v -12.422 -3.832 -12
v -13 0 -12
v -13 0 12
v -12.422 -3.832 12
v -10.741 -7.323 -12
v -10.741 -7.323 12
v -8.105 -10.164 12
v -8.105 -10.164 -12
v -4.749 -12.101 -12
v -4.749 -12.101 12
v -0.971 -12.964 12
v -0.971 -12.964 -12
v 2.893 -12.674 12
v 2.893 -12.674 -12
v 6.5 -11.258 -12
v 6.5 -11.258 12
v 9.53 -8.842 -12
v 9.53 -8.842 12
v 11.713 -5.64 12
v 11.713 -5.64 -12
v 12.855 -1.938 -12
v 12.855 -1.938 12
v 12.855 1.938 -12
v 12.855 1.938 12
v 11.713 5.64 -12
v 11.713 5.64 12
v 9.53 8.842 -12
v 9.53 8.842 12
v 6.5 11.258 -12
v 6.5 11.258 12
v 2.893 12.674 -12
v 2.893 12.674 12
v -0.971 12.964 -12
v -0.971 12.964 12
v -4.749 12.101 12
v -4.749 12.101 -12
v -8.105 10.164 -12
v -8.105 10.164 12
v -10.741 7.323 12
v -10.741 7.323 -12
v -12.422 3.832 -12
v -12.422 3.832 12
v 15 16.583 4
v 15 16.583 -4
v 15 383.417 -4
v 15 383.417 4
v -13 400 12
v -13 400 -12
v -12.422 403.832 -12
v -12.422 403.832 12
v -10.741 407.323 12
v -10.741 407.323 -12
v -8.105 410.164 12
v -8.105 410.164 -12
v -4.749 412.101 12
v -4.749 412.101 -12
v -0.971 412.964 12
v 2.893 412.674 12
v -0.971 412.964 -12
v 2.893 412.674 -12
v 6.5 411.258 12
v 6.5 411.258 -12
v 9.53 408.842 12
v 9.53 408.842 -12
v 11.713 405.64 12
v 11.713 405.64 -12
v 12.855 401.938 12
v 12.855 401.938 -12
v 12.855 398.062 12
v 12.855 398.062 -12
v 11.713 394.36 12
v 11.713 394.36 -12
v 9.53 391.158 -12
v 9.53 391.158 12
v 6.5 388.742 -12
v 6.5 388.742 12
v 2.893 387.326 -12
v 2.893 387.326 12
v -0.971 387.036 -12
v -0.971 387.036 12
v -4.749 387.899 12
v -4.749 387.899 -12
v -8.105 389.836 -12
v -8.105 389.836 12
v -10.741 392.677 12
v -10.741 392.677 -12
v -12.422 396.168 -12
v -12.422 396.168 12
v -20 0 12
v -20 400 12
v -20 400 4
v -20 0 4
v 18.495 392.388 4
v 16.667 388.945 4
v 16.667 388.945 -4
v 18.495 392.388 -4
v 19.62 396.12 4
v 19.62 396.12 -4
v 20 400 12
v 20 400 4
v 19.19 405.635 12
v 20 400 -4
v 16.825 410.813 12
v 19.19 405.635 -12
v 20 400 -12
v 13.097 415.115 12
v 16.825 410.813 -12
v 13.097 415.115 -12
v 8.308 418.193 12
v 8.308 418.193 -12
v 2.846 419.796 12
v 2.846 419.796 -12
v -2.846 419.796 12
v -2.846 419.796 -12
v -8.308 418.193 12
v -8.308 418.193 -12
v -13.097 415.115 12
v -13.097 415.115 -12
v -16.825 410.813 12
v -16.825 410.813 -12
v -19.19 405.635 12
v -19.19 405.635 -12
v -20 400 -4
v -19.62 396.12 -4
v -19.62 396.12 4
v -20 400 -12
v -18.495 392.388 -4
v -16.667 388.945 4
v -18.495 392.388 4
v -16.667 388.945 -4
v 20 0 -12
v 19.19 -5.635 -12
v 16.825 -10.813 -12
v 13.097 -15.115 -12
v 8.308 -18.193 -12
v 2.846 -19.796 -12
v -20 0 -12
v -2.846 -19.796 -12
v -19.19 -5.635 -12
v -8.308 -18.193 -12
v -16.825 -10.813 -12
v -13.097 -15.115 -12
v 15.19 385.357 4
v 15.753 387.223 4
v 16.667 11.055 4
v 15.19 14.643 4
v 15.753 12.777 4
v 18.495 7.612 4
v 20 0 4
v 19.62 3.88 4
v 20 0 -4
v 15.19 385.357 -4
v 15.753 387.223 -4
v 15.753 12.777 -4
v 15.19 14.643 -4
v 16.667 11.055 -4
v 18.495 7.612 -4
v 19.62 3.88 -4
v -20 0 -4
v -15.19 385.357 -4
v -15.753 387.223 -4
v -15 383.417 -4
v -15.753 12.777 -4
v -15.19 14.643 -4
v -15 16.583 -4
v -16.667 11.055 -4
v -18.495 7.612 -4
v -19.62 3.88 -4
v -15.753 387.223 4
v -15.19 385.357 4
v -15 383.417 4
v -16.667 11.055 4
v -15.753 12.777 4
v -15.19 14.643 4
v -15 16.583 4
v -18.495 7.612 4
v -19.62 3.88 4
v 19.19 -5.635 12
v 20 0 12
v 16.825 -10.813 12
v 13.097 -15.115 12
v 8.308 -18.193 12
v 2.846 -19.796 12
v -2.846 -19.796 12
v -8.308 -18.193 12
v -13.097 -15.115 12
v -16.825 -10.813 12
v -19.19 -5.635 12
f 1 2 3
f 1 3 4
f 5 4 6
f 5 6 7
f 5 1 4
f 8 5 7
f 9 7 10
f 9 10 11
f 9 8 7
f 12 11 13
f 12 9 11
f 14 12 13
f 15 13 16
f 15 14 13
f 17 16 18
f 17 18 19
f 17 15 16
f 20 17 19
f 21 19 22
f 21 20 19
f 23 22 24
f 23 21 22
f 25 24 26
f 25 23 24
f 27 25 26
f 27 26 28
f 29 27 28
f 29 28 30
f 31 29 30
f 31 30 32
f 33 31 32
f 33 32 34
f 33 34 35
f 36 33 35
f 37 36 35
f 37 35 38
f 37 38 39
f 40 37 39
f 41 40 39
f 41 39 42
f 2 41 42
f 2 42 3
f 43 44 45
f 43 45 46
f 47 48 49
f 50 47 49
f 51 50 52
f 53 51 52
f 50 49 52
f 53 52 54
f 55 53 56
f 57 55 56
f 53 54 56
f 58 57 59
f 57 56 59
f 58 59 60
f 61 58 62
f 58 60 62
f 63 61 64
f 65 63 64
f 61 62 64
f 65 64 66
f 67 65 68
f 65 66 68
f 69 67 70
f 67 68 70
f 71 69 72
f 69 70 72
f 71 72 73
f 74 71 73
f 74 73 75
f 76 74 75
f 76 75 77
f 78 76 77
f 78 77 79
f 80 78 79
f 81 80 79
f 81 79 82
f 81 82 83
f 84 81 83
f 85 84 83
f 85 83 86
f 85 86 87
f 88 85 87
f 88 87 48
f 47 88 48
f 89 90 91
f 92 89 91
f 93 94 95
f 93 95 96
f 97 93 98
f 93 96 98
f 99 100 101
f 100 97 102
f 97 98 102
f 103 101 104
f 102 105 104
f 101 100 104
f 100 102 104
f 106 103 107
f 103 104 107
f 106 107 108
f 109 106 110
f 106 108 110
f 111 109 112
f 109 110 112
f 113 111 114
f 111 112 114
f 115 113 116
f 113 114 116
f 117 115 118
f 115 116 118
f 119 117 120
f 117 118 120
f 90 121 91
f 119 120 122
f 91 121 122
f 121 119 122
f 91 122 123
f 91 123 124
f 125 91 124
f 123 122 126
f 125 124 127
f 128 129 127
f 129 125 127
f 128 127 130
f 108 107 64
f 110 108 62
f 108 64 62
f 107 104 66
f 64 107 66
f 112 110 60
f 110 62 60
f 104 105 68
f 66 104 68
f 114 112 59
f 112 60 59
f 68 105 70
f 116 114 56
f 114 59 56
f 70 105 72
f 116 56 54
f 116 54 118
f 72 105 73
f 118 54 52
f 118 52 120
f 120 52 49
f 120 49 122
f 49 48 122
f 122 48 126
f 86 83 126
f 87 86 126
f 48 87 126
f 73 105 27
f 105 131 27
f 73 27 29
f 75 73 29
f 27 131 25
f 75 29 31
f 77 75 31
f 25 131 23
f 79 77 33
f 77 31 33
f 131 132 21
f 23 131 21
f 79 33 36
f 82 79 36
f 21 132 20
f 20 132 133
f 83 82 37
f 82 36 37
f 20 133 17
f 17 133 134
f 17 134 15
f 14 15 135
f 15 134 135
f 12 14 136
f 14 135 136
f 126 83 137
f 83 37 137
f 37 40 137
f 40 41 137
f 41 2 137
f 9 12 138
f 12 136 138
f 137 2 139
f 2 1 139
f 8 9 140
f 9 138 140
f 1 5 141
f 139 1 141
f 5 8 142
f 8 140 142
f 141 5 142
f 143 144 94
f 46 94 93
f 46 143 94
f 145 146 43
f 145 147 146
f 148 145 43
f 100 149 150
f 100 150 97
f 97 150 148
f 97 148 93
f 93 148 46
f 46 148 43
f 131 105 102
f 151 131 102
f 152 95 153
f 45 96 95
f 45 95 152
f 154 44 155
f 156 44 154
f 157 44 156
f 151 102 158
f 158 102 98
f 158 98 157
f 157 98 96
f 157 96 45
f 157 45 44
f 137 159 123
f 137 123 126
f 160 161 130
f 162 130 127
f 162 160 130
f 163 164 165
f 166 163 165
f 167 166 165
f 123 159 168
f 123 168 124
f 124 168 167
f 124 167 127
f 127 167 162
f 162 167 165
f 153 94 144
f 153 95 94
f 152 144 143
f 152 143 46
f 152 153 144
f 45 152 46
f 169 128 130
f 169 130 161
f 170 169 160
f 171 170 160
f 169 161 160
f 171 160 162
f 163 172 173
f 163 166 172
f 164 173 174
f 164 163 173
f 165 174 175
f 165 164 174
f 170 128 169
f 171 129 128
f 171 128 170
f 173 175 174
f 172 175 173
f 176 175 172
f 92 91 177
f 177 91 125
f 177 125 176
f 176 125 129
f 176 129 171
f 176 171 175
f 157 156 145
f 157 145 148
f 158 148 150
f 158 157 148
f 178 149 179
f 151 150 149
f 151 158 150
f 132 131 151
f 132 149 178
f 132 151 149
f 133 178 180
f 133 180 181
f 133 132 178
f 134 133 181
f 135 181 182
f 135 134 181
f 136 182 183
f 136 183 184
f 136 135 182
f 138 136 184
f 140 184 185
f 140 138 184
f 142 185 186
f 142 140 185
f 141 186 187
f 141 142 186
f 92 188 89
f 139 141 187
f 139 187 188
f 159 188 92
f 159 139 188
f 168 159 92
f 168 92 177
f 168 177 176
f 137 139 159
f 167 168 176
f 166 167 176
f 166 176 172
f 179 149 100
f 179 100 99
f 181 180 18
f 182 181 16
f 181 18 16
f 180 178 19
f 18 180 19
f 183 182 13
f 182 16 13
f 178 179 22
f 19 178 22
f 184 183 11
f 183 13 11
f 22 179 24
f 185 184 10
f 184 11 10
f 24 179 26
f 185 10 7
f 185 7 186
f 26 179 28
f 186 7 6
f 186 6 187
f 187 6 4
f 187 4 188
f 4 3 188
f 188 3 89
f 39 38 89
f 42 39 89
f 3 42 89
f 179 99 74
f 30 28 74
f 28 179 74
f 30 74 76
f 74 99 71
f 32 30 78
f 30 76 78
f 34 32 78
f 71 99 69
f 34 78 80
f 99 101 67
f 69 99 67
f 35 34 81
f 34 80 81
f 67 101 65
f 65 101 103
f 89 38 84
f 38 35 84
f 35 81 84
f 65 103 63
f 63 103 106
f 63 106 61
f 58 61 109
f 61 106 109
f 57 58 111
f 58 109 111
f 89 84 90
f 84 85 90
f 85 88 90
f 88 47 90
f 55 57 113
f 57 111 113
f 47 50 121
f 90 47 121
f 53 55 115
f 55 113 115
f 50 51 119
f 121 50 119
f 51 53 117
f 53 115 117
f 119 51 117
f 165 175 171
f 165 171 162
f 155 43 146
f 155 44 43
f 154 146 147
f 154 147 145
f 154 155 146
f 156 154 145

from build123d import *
from build123d.topology import SkipClean

# Parameters (mm, degrees)
BOSS_EXTRUDE1_DEPTH = 400
BOSS_EXTRUDE2_REACH = 403.218
SKETCH2_R           = 20
FILLET1_R           = 10
CUT_EXTRUDE1_REACH  = 423.16
SKETCH3_R           = 13


with BuildPart() as part:
    # Sketch1 → Boss-Extrude1 (new body)
    with BuildSketch(Plane(origin=(0, 0, 0), x_dir=(1, 0, 0), z_dir=(0, 1, 0))):
        Polygon((-20, 12), (20, 12), (20, 4), (15, 4), (15, -4), (20, -4), (20, -12), (-20, -12), (-20, -4), (-15, -4), (-15, 4), (-20, 4), align=None)
    extrude(amount=BOSS_EXTRUDE1_DEPTH)

    # Boss-Extrude2: up to this face of the body (flat: up to its plane)
    boss_extrude2_end = Plane(part.part.faces().sort_by_distance((0, 200, 12))[0])
    # Sketch2 → Boss-Extrude2 (add, up to the picked face)
    with BuildSketch(Plane(origin=(0, 0, -12), x_dir=(-1, 0, 0), z_dir=(0, 0, -1)), mode=Mode.PRIVATE) as boss_extrude2_sk1:
        Circle(SKETCH2_R)
    boss_extrude2_tool1 = split(extrude(boss_extrude2_sk1.sketch, amount=-BOSS_EXTRUDE2_REACH, mode=Mode.PRIVATE), bisect_by=boss_extrude2_end, keep=Keep.BOTH, mode=Mode.PRIVATE)
    boss_extrude2 = boss_extrude2_tool1.solids().sort_by(Axis((0, 0, -12), (0, 0, 1)))[0]
    add(boss_extrude2)

    # Mirror1: Boss-Extrude2 across plane
    with SkipClean():  # the faces are left unmerged after this step: merging them gives an invalid solid
        add(boss_extrude2.mirror(Plane.ZX.offset(200)))
    add(part.part.scale(1), mode=Mode.REPLACE)  # the faces are merged on a copy

    # Fillet1
    fillet1_edges = [part.edges().sort_by_distance(p)[0] for p in [
        (15, 13.228756555, 0),
        (-15, 13.228756555, 0),
        (-15, 386.771243445, 0),
        (15, 386.771243445, 0),
    ]]
    fillet(fillet1_edges, radius=FILLET1_R)

    # Sketch3 → Cut-Extrude1 (cut, up to next)
    with BuildSketch(Plane(origin=(0, 0, -12), x_dir=(-1, 0, 0), z_dir=(0, 0, -1)), mode=Mode.PRIVATE) as cut_extrude1_sk1:
        with Locations((0, 400)):
            Circle(SKETCH3_R)
    cut_extrude1_tool1 = extrude(cut_extrude1_sk1.sketch, amount=-CUT_EXTRUDE1_REACH, mode=Mode.PRIVATE) & part.part
    cut_extrude1 = cut_extrude1_tool1.solids().sort_by_distance((0, 400, -12))[0]
    add(cut_extrude1, mode=Mode.SUBTRACT)

    # Mirror2: Cut-Extrude1 across plane
    add(cut_extrude1.mirror(Plane.ZX.offset(200)), mode=Mode.SUBTRACT)


solid = part.part
